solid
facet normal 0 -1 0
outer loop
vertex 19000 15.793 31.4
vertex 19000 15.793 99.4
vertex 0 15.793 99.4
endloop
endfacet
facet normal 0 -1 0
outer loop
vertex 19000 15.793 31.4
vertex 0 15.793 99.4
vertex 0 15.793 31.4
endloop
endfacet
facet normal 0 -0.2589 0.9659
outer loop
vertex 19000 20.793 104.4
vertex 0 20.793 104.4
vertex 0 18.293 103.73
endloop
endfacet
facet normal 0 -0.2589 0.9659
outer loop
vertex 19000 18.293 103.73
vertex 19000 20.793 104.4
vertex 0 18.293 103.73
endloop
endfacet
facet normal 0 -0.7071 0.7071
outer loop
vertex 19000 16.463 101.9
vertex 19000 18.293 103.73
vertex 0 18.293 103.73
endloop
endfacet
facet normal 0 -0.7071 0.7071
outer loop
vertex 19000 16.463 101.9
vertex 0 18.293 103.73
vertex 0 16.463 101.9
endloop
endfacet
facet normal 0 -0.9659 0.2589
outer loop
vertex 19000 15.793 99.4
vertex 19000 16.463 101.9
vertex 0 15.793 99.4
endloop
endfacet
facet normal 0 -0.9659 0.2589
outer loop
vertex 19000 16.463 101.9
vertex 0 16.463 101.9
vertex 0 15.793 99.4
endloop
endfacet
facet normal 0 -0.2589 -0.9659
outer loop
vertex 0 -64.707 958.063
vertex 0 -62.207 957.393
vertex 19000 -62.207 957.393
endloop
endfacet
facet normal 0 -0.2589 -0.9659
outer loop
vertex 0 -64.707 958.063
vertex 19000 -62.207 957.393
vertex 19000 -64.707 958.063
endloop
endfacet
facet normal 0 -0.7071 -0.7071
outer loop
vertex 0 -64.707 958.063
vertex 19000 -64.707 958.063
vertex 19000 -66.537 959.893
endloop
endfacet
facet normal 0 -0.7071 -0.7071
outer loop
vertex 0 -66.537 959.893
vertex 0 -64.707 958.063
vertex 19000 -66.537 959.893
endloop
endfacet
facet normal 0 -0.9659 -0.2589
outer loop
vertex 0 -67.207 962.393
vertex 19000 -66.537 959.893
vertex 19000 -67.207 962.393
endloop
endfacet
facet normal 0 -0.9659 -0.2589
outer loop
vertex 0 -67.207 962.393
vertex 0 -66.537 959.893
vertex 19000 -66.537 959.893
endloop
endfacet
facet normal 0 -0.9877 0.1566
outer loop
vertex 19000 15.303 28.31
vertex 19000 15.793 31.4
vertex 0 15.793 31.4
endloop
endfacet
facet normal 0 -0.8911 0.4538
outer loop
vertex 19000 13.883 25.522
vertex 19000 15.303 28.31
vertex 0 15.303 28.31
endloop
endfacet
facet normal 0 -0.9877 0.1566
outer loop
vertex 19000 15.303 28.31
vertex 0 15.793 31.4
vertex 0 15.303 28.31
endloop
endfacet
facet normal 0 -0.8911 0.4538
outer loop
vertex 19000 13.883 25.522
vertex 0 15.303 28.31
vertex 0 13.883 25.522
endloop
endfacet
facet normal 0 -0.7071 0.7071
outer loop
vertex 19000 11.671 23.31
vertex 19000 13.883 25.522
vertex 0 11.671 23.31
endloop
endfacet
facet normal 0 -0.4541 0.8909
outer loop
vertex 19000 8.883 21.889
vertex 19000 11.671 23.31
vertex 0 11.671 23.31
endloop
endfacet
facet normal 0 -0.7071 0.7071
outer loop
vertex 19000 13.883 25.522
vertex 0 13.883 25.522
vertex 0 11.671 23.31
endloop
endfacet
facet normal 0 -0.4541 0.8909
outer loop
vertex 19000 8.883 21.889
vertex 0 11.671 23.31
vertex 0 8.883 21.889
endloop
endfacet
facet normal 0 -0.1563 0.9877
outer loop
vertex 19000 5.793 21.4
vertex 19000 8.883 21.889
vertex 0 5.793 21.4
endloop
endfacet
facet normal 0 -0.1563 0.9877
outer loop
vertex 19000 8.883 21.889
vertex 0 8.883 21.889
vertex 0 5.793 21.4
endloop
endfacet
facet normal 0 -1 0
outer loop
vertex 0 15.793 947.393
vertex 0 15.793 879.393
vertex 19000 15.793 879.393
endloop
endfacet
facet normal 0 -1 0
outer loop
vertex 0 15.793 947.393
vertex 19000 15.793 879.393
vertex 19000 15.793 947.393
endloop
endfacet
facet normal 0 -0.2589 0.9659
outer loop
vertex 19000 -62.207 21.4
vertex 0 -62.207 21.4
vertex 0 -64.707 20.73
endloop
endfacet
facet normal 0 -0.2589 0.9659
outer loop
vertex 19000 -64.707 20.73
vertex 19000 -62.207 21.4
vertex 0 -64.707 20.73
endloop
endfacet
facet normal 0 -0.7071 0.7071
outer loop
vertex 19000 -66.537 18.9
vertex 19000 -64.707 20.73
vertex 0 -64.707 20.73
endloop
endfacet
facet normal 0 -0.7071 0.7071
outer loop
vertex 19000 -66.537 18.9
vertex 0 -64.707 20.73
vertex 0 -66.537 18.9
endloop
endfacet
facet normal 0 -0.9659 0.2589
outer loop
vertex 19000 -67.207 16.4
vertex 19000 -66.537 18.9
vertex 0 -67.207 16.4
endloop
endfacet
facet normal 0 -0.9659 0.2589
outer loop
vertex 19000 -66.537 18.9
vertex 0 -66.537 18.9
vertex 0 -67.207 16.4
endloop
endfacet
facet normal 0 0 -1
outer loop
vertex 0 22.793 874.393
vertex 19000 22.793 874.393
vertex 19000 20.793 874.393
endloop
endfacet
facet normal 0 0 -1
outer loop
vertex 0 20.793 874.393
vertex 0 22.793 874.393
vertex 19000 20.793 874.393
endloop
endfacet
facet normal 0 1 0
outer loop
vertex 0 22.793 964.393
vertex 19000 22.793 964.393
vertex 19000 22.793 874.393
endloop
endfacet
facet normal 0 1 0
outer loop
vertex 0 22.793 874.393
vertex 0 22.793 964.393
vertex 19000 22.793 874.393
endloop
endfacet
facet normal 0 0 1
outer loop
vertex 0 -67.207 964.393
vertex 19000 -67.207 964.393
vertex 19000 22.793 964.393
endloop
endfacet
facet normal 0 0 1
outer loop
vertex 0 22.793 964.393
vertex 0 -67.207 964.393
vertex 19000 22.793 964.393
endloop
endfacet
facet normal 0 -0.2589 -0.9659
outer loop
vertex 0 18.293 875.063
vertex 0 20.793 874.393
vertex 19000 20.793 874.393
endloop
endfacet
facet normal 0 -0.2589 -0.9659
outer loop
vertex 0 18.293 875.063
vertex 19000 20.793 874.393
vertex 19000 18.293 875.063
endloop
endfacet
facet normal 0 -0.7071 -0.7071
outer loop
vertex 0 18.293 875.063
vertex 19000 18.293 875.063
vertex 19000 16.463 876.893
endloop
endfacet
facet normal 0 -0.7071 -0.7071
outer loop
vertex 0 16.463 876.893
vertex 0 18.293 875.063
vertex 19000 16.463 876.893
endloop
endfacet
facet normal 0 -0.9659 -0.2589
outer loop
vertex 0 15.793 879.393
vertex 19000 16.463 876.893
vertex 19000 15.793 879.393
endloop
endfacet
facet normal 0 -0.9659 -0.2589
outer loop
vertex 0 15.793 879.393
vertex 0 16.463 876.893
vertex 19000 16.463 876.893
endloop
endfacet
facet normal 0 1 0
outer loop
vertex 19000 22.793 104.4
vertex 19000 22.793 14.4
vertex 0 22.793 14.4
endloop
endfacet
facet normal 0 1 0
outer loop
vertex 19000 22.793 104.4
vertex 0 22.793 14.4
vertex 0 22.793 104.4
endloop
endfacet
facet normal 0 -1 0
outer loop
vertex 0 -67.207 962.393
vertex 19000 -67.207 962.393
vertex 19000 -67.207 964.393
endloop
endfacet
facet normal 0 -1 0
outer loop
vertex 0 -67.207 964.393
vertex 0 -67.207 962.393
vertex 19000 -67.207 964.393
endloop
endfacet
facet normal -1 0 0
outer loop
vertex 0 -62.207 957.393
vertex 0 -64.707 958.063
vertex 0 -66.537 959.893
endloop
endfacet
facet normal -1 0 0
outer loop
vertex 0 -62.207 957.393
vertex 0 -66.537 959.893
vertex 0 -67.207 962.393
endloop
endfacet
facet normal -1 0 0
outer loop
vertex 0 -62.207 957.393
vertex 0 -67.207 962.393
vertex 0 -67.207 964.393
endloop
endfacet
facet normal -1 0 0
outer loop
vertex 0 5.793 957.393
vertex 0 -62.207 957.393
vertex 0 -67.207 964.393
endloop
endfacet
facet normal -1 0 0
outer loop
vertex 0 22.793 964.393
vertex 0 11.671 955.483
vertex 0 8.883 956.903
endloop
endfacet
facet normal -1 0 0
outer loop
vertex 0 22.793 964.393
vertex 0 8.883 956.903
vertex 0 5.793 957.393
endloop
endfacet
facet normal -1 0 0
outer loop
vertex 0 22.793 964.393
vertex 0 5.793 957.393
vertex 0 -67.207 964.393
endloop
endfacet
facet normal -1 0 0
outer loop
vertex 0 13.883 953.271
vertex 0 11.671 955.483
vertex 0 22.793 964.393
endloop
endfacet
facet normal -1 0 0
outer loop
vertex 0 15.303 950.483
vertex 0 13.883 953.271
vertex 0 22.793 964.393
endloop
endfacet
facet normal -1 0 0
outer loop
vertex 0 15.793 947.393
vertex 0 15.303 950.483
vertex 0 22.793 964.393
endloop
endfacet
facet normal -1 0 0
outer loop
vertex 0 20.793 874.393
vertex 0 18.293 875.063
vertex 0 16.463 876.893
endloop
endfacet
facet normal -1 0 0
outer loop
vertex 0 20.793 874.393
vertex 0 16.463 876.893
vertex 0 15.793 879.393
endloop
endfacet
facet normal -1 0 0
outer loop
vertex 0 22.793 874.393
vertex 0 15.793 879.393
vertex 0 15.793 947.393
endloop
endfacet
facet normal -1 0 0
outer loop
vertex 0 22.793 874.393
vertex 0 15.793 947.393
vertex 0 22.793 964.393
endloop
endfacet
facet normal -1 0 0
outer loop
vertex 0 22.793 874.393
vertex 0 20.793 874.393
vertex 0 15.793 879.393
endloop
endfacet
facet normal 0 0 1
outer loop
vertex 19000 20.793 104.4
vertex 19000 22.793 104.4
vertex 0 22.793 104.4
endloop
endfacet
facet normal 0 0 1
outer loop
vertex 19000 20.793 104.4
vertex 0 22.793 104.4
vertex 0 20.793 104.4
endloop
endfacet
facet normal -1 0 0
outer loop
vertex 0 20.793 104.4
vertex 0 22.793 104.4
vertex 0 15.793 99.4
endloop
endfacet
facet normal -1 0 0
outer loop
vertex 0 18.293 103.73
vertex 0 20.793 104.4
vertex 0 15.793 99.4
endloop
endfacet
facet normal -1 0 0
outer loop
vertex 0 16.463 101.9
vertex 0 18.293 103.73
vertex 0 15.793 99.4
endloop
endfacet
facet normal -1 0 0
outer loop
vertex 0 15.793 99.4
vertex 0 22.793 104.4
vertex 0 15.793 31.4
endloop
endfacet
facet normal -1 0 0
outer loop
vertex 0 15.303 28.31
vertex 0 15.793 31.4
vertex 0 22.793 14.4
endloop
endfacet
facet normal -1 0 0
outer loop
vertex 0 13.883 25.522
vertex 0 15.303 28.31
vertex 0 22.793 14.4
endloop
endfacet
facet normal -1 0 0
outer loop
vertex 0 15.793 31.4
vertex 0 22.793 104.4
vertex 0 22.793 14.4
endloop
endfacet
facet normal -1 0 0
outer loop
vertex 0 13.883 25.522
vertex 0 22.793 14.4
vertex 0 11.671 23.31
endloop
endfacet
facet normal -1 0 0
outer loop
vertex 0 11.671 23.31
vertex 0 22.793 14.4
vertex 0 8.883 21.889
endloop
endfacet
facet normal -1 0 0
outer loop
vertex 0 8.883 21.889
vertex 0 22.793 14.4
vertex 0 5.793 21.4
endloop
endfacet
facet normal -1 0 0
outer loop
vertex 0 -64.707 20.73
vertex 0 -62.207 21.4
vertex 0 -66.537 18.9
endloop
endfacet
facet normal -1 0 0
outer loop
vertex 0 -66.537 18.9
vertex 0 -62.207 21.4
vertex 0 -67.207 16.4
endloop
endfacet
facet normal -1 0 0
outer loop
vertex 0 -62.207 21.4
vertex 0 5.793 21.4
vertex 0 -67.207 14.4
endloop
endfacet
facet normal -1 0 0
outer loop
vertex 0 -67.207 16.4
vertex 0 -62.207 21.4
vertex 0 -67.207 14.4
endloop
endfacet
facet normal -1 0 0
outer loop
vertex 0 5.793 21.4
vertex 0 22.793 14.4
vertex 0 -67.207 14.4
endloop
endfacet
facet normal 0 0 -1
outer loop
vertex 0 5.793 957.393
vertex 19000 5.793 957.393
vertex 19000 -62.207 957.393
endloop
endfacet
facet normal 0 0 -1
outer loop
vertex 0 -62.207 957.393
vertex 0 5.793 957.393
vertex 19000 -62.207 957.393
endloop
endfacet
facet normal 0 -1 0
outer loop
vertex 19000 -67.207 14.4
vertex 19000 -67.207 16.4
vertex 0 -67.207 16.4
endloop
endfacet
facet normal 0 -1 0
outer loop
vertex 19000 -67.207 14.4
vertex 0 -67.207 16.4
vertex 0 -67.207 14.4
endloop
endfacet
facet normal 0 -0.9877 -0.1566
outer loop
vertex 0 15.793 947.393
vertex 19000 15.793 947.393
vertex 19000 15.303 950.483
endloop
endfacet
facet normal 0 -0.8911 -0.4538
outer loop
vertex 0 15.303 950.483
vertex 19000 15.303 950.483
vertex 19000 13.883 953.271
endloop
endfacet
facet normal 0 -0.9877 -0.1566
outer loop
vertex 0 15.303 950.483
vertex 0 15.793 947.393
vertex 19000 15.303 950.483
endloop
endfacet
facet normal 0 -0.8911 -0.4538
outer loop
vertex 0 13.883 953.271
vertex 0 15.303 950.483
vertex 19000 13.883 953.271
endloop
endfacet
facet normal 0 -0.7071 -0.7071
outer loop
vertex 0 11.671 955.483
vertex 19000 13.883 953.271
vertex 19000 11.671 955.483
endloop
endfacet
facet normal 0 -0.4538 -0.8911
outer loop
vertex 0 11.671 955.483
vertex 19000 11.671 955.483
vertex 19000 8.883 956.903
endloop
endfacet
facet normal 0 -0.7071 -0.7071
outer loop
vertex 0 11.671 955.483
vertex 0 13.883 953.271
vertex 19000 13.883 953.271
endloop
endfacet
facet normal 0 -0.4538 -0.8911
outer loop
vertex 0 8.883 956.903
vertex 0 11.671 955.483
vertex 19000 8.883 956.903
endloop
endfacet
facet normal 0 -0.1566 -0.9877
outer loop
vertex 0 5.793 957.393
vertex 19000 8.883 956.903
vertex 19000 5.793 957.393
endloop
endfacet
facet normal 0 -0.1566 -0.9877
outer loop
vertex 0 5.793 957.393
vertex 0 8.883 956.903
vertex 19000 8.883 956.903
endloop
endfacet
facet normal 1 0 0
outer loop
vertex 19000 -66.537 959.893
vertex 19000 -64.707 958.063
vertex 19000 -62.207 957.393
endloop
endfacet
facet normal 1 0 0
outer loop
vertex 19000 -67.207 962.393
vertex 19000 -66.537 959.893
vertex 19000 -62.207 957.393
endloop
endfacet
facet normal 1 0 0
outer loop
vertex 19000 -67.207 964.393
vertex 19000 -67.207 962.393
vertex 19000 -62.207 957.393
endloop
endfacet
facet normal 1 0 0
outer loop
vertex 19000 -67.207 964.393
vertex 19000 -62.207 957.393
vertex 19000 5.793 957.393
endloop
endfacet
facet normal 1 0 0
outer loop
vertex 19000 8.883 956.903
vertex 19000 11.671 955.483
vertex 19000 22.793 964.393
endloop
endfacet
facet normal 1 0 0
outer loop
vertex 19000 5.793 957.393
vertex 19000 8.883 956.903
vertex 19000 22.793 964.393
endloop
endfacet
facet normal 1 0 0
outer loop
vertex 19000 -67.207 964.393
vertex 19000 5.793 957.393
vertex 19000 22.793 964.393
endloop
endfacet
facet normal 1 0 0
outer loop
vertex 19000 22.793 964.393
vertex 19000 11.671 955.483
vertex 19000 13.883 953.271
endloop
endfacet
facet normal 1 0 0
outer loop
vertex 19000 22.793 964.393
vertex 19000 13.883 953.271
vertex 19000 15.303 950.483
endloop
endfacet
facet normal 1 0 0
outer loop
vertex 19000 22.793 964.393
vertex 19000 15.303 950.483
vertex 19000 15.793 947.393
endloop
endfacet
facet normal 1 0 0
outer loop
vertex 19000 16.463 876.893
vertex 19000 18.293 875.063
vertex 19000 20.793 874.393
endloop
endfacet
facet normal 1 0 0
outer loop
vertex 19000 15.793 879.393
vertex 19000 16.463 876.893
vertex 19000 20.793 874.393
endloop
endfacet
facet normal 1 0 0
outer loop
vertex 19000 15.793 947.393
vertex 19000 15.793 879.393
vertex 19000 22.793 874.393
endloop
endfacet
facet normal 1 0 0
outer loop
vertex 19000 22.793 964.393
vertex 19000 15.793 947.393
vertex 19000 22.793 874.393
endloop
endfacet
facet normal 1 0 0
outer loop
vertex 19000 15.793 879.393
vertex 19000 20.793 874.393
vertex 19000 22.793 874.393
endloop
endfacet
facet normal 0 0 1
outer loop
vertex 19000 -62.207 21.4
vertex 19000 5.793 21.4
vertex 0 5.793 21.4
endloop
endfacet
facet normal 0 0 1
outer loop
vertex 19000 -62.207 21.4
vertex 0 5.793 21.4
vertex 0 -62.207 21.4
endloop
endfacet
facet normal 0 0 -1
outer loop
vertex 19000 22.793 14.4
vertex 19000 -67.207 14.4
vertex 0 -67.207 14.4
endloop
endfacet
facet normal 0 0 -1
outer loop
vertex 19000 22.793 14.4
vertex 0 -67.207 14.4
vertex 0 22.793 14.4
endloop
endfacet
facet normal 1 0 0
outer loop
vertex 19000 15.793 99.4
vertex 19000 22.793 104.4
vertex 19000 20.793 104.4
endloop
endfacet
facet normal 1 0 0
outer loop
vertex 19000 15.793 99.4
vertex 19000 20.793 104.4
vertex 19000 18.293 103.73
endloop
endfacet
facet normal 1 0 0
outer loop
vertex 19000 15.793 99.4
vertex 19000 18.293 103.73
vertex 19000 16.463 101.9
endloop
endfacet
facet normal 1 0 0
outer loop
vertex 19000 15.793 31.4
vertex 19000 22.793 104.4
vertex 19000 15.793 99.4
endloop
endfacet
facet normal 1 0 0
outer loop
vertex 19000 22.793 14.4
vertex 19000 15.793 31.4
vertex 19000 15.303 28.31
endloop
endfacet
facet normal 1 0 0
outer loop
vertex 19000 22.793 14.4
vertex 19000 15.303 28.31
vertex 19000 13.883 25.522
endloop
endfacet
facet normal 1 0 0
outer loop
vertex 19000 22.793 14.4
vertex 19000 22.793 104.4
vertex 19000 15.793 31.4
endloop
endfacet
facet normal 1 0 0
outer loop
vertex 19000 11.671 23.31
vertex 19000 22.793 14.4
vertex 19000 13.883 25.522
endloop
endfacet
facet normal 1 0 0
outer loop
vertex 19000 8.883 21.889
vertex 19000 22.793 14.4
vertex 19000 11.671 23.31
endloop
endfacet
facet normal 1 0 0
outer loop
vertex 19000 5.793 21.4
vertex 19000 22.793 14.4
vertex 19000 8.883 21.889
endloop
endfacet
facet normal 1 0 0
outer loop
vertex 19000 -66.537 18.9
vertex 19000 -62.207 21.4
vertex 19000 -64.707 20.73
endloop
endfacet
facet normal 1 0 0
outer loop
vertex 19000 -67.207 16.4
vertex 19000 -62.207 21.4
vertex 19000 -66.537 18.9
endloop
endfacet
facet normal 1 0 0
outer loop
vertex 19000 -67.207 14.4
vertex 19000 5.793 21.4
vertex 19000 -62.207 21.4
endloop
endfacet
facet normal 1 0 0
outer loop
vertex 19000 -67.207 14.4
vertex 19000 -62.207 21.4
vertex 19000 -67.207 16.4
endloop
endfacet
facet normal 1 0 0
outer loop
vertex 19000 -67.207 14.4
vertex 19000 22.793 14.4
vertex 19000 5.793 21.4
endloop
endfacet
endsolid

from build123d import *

# Parameters (mm, degrees)
EXTRUDE017_DEPTH = 19000
EXTRUDE018_DEPTH = 19000


with BuildPart() as extrude017:
    # AngleSteel004 → Extrude017 (new body)
    with BuildSketch(Plane(origin=(0, 53.415282, 39.015282), x_dir=(0, 1, 0), z_dir=(-1, 0, 0))):
        with BuildLine():
            Line((-24.615282, 24.615282), (-24.615282, -65.384718))
            Line((-24.615282, -65.384718), (-22.615282, -65.384718))
            ThreePointArc((-22.615282, -65.384718), (-19.079748, -63.920252), (-17.615282, -60.384718))
            Line((-17.615282, -60.384718), (-17.615282, 7.615282))
            ThreePointArc((-17.615282, 7.615282), (-14.68635, 14.68635), (-7.615282, 17.615282))
            Line((-7.615282, 17.615282), (60.384718, 17.615282))
            ThreePointArc((60.384718, 17.615282), (63.920252, 19.079748), (65.384718, 22.615282))
            Line((65.384718, 22.615282), (65.384718, 24.615282))
            Line((65.384718, 24.615282), (-24.615282, 24.615282))
        make_face()
    extrude(amount=-EXTRUDE017_DEPTH)


with BuildPart() as fusion001:
    # Mirror → Extrude018 (new body)
    with BuildSketch(Plane(origin=(0, 53.415282, 939.777402), x_dir=(0, -1, 0), z_dir=(1, 0, 0))):
        with BuildLine():
            Line((24.615282, -24.615282), (24.615282, 65.384718))
            Line((24.615282, 65.384718), (22.615282, 65.384718))
            ThreePointArc((22.615282, 65.384718), (19.079748, 63.920252), (17.615282, 60.384718))
            Line((17.615282, 60.384718), (17.615282, -7.615282))
            ThreePointArc((17.615282, -7.615282), (14.68635, -14.68635), (7.615282, -17.615282))
            Line((7.615282, -17.615282), (-60.384718, -17.615282))
            ThreePointArc((-60.384718, -17.615282), (-63.920252, -19.079748), (-65.384718, -22.615282))
            Line((-65.384718, -22.615282), (-65.384718, -24.615282))
            Line((-65.384718, -24.615282), (24.615282, -24.615282))
        make_face()
    extrude(amount=EXTRUDE018_DEPTH)

    # Fusion001: union Extrude017
    add(extrude017.part)


with BuildPart() as fusion_mirrored:
    # Mirror001: instance of Fusion001
    add(fusion001.part.mirror(Plane(origin=(0, 28.796342, 514.396342), x_dir=(-1, 0, 0), z_dir=(0, -1, 0))))


with BuildPart() as fusion_mirrored_1:
    # Mirror001 placement: moved
    add(fusion_mirrored.part.moved(Location((0, -6, 0))))


solid = fusion_mirrored_1.part
